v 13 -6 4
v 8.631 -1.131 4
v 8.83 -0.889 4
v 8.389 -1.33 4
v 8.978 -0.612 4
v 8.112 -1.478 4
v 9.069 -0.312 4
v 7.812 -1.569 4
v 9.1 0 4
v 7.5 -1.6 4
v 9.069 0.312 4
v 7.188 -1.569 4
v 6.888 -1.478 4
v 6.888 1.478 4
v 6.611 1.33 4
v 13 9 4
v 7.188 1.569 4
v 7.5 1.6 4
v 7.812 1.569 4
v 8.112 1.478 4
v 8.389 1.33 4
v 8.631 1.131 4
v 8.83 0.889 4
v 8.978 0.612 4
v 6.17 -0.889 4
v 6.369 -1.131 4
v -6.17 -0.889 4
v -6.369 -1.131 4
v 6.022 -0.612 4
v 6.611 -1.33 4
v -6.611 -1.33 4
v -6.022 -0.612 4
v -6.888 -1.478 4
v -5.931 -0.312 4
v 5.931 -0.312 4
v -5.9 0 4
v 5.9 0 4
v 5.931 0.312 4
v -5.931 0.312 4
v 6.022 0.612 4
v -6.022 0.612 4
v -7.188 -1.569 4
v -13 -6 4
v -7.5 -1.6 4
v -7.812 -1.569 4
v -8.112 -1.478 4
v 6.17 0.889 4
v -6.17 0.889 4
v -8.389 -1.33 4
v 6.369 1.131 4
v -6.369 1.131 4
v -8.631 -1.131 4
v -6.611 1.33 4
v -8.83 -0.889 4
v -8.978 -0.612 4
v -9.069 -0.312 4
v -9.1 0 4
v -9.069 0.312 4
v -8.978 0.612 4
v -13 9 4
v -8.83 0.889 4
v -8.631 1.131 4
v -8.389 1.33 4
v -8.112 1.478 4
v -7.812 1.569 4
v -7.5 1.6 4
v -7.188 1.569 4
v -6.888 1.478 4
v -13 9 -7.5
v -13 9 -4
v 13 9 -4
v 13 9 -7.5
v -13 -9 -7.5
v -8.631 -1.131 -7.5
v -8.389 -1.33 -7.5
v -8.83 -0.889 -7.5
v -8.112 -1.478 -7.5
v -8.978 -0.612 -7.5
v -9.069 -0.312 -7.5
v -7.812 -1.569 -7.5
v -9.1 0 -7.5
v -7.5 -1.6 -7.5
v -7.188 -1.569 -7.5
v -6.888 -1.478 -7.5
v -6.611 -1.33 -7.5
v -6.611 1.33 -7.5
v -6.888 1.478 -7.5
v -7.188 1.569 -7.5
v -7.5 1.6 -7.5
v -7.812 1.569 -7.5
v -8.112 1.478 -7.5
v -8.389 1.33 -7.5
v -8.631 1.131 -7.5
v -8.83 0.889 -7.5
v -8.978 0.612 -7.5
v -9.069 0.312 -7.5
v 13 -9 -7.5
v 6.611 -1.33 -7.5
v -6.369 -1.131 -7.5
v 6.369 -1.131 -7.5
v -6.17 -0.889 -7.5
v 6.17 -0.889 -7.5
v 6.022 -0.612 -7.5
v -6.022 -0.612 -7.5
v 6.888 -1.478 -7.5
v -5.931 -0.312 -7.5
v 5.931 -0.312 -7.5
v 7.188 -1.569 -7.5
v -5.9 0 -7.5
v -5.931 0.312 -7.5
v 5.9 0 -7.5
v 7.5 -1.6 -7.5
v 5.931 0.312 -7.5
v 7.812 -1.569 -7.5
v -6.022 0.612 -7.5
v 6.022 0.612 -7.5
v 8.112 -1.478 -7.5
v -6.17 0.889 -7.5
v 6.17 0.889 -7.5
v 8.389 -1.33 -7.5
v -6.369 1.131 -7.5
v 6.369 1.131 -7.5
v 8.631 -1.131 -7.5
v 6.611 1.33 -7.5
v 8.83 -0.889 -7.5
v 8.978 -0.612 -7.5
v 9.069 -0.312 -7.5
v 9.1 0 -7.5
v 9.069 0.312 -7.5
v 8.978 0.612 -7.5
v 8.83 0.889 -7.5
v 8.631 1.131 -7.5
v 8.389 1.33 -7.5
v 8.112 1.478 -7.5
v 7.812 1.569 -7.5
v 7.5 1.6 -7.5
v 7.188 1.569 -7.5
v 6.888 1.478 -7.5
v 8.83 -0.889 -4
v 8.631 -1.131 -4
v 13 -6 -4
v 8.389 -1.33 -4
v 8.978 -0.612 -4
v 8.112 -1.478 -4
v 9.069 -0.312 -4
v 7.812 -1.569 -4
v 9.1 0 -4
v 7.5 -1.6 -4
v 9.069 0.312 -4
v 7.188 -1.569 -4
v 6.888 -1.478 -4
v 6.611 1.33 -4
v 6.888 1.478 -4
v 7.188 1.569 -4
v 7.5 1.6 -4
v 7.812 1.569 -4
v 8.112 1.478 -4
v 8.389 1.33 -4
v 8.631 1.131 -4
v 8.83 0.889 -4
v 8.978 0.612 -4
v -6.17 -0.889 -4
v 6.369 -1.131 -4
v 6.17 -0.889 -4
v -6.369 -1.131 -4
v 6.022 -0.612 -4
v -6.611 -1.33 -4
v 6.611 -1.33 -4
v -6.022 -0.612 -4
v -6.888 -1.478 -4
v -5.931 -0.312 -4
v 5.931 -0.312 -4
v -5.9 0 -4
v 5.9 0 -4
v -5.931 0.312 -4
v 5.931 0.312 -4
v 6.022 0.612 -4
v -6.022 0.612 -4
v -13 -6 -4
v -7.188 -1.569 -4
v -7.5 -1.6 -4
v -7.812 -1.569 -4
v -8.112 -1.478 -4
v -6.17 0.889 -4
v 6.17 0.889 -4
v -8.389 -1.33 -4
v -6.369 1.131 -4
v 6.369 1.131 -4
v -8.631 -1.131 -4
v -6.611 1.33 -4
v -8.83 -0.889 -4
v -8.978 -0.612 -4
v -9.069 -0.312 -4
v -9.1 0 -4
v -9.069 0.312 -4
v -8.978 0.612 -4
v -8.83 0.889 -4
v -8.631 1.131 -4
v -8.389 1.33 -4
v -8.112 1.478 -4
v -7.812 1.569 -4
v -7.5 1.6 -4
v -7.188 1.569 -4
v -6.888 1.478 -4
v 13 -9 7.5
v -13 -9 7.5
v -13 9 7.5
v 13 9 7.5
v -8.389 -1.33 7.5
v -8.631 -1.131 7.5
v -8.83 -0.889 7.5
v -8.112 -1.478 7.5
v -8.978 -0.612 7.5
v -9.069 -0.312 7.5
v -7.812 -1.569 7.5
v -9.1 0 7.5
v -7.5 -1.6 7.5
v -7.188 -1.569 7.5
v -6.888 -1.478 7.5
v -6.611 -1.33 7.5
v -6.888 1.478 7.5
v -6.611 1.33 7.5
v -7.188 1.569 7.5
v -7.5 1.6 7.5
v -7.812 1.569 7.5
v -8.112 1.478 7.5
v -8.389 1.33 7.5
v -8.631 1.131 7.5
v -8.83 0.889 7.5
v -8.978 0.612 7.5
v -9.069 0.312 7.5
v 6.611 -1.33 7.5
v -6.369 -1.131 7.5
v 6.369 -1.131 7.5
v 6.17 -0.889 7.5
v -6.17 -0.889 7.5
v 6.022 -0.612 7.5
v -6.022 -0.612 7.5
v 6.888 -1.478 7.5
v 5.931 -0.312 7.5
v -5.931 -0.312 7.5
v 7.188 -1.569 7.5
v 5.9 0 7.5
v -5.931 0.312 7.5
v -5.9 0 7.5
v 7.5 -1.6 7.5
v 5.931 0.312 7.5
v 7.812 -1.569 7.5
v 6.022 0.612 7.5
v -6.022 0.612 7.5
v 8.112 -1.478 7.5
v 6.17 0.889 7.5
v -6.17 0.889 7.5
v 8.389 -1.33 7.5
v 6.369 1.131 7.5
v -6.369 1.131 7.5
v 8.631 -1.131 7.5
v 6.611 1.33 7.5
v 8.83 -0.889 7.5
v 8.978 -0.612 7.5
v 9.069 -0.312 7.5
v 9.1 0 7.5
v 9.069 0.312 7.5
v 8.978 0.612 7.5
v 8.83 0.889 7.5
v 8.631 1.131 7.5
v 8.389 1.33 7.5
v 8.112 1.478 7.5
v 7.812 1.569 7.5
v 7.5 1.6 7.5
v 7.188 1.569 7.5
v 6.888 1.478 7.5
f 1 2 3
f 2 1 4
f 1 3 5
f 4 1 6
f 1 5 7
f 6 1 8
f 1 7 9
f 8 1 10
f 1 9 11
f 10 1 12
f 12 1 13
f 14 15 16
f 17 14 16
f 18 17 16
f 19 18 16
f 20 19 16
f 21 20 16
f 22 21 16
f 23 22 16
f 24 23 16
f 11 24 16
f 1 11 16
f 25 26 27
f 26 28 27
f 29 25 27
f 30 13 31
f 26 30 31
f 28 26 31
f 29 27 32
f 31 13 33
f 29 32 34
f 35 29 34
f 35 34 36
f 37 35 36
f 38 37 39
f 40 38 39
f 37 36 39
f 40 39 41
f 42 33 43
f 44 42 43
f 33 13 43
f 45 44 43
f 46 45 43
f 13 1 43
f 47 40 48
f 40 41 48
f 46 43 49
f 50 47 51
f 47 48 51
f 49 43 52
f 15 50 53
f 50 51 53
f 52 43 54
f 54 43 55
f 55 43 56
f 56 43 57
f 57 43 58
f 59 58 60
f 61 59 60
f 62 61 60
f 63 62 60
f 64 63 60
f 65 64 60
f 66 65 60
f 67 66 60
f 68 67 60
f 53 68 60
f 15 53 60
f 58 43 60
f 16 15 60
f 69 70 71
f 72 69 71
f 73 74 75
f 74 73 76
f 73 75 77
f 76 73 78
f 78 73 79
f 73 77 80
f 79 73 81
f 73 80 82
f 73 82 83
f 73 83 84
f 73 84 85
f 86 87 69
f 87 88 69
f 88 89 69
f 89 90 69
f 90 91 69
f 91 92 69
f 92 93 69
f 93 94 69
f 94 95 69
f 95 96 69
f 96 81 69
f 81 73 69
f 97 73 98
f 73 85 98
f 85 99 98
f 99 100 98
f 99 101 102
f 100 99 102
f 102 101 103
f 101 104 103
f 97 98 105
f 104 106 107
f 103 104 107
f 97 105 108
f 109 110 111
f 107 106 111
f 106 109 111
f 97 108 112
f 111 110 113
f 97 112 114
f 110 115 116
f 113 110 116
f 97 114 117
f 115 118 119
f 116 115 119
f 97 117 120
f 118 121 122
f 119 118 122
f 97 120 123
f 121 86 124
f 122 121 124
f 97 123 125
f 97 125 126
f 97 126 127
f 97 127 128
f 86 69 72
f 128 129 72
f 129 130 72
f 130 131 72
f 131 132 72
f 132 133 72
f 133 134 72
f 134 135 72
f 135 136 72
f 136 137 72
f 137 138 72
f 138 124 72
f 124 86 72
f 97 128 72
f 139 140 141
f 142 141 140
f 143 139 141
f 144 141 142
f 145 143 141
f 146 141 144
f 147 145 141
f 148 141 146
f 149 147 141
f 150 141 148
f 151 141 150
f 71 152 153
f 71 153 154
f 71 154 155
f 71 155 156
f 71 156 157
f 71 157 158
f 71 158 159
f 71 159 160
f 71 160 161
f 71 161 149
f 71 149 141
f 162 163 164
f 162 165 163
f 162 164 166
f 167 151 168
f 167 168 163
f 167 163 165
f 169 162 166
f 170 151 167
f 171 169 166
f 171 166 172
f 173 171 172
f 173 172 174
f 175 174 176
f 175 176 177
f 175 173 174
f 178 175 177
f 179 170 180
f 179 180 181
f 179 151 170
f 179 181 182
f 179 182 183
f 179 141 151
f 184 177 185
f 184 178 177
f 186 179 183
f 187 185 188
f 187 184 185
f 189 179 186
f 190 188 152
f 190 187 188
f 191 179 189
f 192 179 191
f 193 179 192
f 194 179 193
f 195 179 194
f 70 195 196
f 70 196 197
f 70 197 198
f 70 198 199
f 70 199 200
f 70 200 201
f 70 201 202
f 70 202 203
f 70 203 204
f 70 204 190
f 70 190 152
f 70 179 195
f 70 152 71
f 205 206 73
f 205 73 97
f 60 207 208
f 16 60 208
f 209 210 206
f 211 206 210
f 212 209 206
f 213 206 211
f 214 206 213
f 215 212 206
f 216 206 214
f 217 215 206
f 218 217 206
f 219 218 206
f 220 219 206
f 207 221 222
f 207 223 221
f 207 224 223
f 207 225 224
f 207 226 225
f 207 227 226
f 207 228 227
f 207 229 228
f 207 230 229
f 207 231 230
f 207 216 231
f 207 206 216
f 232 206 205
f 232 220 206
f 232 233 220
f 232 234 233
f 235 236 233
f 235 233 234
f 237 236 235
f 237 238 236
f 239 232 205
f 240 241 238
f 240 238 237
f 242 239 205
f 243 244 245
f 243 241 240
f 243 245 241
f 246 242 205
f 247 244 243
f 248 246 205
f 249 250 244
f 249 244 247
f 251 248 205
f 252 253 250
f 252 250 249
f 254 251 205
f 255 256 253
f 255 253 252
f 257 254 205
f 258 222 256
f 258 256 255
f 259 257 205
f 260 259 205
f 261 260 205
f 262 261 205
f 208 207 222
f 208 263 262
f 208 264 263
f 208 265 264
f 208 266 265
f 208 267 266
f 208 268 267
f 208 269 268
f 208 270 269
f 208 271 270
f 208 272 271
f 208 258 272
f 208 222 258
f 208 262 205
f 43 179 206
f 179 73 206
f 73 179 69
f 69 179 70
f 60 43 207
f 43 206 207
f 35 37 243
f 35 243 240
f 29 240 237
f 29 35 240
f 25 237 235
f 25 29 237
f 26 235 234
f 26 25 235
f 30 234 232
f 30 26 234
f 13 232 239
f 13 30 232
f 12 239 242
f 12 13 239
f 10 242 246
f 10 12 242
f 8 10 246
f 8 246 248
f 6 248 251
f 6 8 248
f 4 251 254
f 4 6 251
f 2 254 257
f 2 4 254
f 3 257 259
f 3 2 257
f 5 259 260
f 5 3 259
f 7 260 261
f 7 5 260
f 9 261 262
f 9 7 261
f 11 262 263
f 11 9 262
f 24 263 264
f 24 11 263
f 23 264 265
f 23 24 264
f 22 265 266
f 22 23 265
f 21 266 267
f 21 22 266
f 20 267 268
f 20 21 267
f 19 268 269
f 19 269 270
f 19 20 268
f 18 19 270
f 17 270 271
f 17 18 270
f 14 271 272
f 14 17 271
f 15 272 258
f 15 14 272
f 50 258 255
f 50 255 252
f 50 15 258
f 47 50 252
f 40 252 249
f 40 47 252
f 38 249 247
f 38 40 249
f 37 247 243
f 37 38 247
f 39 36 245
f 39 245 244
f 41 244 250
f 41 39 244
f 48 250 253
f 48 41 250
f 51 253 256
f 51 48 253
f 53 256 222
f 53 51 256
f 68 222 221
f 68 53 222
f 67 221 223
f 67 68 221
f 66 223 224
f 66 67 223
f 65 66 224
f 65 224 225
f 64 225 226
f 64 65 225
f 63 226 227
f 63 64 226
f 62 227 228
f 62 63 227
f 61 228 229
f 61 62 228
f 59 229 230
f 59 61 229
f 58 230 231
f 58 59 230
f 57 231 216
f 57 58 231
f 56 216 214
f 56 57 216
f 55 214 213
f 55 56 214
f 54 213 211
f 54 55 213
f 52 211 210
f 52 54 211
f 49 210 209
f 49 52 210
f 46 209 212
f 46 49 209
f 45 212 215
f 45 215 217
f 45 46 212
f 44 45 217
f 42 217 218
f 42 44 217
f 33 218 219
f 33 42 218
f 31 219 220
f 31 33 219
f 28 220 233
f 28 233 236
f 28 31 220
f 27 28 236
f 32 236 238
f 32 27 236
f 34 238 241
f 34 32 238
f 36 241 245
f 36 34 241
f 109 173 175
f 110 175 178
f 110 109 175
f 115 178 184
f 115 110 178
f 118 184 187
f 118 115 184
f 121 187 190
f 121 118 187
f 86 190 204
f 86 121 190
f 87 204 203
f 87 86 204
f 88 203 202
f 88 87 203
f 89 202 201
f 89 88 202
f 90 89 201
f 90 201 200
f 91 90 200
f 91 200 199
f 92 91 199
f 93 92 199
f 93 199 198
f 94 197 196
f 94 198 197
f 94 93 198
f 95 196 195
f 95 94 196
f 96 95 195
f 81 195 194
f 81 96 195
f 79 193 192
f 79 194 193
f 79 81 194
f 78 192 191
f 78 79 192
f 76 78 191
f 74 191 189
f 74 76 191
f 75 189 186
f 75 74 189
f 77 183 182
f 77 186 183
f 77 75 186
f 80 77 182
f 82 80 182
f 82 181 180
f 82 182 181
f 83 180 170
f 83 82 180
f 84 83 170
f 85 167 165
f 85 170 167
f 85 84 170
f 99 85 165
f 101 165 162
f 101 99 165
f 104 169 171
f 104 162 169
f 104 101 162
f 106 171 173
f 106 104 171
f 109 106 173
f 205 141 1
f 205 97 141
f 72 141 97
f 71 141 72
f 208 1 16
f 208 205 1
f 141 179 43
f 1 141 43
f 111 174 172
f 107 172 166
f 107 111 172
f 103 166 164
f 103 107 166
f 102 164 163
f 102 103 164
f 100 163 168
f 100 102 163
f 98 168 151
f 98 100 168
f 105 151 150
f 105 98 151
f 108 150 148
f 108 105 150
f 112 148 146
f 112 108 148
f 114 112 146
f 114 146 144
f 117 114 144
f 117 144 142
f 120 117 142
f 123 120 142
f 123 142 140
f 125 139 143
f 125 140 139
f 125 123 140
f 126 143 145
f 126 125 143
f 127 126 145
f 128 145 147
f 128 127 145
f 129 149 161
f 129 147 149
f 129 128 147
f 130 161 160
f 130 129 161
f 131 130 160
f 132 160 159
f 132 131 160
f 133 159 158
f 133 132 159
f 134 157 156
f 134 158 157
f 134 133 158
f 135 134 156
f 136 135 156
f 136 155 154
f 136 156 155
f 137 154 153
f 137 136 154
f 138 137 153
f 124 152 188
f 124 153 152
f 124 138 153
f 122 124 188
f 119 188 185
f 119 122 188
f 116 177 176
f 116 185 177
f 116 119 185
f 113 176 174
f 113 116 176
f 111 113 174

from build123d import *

# Parameters (mm, degrees)
SKETCH_1_W          = 26
SKETCH_1_H          = 18
SKETCH_1_R          = 1.6
EXTRUDE_1_DEPTH     = 7.5
SKETCH_3_W          = 8
SKETCH_3_H          = 15
CUT_EXTRUDE_2_DEPTH = 30


with BuildPart() as part:
    # 草图1 → 凸台-拉伸1 (new, symmetric)
    with BuildSketch(Plane.XY):
        Rectangle(SKETCH_1_W, SKETCH_1_H)
        with Locations((-7.5, 0)):
            Circle(SKETCH_1_R, mode=Mode.SUBTRACT)
        with Locations(Location((7.5, 0, 0), (0, 0, 180))):
            Circle(SKETCH_1_R, mode=Mode.SUBTRACT)
    extrude(amount=EXTRUDE_1_DEPTH, both=True)

    # 草图3 → 切除-拉伸2 (cut)
    with BuildSketch(Plane.ZY.offset(13)):
        with Locations((0, 1.5)):
            Rectangle(SKETCH_3_W, SKETCH_3_H)
    extrude(amount=-CUT_EXTRUDE_2_DEPTH, mode=Mode.SUBTRACT)


solid = part.part
